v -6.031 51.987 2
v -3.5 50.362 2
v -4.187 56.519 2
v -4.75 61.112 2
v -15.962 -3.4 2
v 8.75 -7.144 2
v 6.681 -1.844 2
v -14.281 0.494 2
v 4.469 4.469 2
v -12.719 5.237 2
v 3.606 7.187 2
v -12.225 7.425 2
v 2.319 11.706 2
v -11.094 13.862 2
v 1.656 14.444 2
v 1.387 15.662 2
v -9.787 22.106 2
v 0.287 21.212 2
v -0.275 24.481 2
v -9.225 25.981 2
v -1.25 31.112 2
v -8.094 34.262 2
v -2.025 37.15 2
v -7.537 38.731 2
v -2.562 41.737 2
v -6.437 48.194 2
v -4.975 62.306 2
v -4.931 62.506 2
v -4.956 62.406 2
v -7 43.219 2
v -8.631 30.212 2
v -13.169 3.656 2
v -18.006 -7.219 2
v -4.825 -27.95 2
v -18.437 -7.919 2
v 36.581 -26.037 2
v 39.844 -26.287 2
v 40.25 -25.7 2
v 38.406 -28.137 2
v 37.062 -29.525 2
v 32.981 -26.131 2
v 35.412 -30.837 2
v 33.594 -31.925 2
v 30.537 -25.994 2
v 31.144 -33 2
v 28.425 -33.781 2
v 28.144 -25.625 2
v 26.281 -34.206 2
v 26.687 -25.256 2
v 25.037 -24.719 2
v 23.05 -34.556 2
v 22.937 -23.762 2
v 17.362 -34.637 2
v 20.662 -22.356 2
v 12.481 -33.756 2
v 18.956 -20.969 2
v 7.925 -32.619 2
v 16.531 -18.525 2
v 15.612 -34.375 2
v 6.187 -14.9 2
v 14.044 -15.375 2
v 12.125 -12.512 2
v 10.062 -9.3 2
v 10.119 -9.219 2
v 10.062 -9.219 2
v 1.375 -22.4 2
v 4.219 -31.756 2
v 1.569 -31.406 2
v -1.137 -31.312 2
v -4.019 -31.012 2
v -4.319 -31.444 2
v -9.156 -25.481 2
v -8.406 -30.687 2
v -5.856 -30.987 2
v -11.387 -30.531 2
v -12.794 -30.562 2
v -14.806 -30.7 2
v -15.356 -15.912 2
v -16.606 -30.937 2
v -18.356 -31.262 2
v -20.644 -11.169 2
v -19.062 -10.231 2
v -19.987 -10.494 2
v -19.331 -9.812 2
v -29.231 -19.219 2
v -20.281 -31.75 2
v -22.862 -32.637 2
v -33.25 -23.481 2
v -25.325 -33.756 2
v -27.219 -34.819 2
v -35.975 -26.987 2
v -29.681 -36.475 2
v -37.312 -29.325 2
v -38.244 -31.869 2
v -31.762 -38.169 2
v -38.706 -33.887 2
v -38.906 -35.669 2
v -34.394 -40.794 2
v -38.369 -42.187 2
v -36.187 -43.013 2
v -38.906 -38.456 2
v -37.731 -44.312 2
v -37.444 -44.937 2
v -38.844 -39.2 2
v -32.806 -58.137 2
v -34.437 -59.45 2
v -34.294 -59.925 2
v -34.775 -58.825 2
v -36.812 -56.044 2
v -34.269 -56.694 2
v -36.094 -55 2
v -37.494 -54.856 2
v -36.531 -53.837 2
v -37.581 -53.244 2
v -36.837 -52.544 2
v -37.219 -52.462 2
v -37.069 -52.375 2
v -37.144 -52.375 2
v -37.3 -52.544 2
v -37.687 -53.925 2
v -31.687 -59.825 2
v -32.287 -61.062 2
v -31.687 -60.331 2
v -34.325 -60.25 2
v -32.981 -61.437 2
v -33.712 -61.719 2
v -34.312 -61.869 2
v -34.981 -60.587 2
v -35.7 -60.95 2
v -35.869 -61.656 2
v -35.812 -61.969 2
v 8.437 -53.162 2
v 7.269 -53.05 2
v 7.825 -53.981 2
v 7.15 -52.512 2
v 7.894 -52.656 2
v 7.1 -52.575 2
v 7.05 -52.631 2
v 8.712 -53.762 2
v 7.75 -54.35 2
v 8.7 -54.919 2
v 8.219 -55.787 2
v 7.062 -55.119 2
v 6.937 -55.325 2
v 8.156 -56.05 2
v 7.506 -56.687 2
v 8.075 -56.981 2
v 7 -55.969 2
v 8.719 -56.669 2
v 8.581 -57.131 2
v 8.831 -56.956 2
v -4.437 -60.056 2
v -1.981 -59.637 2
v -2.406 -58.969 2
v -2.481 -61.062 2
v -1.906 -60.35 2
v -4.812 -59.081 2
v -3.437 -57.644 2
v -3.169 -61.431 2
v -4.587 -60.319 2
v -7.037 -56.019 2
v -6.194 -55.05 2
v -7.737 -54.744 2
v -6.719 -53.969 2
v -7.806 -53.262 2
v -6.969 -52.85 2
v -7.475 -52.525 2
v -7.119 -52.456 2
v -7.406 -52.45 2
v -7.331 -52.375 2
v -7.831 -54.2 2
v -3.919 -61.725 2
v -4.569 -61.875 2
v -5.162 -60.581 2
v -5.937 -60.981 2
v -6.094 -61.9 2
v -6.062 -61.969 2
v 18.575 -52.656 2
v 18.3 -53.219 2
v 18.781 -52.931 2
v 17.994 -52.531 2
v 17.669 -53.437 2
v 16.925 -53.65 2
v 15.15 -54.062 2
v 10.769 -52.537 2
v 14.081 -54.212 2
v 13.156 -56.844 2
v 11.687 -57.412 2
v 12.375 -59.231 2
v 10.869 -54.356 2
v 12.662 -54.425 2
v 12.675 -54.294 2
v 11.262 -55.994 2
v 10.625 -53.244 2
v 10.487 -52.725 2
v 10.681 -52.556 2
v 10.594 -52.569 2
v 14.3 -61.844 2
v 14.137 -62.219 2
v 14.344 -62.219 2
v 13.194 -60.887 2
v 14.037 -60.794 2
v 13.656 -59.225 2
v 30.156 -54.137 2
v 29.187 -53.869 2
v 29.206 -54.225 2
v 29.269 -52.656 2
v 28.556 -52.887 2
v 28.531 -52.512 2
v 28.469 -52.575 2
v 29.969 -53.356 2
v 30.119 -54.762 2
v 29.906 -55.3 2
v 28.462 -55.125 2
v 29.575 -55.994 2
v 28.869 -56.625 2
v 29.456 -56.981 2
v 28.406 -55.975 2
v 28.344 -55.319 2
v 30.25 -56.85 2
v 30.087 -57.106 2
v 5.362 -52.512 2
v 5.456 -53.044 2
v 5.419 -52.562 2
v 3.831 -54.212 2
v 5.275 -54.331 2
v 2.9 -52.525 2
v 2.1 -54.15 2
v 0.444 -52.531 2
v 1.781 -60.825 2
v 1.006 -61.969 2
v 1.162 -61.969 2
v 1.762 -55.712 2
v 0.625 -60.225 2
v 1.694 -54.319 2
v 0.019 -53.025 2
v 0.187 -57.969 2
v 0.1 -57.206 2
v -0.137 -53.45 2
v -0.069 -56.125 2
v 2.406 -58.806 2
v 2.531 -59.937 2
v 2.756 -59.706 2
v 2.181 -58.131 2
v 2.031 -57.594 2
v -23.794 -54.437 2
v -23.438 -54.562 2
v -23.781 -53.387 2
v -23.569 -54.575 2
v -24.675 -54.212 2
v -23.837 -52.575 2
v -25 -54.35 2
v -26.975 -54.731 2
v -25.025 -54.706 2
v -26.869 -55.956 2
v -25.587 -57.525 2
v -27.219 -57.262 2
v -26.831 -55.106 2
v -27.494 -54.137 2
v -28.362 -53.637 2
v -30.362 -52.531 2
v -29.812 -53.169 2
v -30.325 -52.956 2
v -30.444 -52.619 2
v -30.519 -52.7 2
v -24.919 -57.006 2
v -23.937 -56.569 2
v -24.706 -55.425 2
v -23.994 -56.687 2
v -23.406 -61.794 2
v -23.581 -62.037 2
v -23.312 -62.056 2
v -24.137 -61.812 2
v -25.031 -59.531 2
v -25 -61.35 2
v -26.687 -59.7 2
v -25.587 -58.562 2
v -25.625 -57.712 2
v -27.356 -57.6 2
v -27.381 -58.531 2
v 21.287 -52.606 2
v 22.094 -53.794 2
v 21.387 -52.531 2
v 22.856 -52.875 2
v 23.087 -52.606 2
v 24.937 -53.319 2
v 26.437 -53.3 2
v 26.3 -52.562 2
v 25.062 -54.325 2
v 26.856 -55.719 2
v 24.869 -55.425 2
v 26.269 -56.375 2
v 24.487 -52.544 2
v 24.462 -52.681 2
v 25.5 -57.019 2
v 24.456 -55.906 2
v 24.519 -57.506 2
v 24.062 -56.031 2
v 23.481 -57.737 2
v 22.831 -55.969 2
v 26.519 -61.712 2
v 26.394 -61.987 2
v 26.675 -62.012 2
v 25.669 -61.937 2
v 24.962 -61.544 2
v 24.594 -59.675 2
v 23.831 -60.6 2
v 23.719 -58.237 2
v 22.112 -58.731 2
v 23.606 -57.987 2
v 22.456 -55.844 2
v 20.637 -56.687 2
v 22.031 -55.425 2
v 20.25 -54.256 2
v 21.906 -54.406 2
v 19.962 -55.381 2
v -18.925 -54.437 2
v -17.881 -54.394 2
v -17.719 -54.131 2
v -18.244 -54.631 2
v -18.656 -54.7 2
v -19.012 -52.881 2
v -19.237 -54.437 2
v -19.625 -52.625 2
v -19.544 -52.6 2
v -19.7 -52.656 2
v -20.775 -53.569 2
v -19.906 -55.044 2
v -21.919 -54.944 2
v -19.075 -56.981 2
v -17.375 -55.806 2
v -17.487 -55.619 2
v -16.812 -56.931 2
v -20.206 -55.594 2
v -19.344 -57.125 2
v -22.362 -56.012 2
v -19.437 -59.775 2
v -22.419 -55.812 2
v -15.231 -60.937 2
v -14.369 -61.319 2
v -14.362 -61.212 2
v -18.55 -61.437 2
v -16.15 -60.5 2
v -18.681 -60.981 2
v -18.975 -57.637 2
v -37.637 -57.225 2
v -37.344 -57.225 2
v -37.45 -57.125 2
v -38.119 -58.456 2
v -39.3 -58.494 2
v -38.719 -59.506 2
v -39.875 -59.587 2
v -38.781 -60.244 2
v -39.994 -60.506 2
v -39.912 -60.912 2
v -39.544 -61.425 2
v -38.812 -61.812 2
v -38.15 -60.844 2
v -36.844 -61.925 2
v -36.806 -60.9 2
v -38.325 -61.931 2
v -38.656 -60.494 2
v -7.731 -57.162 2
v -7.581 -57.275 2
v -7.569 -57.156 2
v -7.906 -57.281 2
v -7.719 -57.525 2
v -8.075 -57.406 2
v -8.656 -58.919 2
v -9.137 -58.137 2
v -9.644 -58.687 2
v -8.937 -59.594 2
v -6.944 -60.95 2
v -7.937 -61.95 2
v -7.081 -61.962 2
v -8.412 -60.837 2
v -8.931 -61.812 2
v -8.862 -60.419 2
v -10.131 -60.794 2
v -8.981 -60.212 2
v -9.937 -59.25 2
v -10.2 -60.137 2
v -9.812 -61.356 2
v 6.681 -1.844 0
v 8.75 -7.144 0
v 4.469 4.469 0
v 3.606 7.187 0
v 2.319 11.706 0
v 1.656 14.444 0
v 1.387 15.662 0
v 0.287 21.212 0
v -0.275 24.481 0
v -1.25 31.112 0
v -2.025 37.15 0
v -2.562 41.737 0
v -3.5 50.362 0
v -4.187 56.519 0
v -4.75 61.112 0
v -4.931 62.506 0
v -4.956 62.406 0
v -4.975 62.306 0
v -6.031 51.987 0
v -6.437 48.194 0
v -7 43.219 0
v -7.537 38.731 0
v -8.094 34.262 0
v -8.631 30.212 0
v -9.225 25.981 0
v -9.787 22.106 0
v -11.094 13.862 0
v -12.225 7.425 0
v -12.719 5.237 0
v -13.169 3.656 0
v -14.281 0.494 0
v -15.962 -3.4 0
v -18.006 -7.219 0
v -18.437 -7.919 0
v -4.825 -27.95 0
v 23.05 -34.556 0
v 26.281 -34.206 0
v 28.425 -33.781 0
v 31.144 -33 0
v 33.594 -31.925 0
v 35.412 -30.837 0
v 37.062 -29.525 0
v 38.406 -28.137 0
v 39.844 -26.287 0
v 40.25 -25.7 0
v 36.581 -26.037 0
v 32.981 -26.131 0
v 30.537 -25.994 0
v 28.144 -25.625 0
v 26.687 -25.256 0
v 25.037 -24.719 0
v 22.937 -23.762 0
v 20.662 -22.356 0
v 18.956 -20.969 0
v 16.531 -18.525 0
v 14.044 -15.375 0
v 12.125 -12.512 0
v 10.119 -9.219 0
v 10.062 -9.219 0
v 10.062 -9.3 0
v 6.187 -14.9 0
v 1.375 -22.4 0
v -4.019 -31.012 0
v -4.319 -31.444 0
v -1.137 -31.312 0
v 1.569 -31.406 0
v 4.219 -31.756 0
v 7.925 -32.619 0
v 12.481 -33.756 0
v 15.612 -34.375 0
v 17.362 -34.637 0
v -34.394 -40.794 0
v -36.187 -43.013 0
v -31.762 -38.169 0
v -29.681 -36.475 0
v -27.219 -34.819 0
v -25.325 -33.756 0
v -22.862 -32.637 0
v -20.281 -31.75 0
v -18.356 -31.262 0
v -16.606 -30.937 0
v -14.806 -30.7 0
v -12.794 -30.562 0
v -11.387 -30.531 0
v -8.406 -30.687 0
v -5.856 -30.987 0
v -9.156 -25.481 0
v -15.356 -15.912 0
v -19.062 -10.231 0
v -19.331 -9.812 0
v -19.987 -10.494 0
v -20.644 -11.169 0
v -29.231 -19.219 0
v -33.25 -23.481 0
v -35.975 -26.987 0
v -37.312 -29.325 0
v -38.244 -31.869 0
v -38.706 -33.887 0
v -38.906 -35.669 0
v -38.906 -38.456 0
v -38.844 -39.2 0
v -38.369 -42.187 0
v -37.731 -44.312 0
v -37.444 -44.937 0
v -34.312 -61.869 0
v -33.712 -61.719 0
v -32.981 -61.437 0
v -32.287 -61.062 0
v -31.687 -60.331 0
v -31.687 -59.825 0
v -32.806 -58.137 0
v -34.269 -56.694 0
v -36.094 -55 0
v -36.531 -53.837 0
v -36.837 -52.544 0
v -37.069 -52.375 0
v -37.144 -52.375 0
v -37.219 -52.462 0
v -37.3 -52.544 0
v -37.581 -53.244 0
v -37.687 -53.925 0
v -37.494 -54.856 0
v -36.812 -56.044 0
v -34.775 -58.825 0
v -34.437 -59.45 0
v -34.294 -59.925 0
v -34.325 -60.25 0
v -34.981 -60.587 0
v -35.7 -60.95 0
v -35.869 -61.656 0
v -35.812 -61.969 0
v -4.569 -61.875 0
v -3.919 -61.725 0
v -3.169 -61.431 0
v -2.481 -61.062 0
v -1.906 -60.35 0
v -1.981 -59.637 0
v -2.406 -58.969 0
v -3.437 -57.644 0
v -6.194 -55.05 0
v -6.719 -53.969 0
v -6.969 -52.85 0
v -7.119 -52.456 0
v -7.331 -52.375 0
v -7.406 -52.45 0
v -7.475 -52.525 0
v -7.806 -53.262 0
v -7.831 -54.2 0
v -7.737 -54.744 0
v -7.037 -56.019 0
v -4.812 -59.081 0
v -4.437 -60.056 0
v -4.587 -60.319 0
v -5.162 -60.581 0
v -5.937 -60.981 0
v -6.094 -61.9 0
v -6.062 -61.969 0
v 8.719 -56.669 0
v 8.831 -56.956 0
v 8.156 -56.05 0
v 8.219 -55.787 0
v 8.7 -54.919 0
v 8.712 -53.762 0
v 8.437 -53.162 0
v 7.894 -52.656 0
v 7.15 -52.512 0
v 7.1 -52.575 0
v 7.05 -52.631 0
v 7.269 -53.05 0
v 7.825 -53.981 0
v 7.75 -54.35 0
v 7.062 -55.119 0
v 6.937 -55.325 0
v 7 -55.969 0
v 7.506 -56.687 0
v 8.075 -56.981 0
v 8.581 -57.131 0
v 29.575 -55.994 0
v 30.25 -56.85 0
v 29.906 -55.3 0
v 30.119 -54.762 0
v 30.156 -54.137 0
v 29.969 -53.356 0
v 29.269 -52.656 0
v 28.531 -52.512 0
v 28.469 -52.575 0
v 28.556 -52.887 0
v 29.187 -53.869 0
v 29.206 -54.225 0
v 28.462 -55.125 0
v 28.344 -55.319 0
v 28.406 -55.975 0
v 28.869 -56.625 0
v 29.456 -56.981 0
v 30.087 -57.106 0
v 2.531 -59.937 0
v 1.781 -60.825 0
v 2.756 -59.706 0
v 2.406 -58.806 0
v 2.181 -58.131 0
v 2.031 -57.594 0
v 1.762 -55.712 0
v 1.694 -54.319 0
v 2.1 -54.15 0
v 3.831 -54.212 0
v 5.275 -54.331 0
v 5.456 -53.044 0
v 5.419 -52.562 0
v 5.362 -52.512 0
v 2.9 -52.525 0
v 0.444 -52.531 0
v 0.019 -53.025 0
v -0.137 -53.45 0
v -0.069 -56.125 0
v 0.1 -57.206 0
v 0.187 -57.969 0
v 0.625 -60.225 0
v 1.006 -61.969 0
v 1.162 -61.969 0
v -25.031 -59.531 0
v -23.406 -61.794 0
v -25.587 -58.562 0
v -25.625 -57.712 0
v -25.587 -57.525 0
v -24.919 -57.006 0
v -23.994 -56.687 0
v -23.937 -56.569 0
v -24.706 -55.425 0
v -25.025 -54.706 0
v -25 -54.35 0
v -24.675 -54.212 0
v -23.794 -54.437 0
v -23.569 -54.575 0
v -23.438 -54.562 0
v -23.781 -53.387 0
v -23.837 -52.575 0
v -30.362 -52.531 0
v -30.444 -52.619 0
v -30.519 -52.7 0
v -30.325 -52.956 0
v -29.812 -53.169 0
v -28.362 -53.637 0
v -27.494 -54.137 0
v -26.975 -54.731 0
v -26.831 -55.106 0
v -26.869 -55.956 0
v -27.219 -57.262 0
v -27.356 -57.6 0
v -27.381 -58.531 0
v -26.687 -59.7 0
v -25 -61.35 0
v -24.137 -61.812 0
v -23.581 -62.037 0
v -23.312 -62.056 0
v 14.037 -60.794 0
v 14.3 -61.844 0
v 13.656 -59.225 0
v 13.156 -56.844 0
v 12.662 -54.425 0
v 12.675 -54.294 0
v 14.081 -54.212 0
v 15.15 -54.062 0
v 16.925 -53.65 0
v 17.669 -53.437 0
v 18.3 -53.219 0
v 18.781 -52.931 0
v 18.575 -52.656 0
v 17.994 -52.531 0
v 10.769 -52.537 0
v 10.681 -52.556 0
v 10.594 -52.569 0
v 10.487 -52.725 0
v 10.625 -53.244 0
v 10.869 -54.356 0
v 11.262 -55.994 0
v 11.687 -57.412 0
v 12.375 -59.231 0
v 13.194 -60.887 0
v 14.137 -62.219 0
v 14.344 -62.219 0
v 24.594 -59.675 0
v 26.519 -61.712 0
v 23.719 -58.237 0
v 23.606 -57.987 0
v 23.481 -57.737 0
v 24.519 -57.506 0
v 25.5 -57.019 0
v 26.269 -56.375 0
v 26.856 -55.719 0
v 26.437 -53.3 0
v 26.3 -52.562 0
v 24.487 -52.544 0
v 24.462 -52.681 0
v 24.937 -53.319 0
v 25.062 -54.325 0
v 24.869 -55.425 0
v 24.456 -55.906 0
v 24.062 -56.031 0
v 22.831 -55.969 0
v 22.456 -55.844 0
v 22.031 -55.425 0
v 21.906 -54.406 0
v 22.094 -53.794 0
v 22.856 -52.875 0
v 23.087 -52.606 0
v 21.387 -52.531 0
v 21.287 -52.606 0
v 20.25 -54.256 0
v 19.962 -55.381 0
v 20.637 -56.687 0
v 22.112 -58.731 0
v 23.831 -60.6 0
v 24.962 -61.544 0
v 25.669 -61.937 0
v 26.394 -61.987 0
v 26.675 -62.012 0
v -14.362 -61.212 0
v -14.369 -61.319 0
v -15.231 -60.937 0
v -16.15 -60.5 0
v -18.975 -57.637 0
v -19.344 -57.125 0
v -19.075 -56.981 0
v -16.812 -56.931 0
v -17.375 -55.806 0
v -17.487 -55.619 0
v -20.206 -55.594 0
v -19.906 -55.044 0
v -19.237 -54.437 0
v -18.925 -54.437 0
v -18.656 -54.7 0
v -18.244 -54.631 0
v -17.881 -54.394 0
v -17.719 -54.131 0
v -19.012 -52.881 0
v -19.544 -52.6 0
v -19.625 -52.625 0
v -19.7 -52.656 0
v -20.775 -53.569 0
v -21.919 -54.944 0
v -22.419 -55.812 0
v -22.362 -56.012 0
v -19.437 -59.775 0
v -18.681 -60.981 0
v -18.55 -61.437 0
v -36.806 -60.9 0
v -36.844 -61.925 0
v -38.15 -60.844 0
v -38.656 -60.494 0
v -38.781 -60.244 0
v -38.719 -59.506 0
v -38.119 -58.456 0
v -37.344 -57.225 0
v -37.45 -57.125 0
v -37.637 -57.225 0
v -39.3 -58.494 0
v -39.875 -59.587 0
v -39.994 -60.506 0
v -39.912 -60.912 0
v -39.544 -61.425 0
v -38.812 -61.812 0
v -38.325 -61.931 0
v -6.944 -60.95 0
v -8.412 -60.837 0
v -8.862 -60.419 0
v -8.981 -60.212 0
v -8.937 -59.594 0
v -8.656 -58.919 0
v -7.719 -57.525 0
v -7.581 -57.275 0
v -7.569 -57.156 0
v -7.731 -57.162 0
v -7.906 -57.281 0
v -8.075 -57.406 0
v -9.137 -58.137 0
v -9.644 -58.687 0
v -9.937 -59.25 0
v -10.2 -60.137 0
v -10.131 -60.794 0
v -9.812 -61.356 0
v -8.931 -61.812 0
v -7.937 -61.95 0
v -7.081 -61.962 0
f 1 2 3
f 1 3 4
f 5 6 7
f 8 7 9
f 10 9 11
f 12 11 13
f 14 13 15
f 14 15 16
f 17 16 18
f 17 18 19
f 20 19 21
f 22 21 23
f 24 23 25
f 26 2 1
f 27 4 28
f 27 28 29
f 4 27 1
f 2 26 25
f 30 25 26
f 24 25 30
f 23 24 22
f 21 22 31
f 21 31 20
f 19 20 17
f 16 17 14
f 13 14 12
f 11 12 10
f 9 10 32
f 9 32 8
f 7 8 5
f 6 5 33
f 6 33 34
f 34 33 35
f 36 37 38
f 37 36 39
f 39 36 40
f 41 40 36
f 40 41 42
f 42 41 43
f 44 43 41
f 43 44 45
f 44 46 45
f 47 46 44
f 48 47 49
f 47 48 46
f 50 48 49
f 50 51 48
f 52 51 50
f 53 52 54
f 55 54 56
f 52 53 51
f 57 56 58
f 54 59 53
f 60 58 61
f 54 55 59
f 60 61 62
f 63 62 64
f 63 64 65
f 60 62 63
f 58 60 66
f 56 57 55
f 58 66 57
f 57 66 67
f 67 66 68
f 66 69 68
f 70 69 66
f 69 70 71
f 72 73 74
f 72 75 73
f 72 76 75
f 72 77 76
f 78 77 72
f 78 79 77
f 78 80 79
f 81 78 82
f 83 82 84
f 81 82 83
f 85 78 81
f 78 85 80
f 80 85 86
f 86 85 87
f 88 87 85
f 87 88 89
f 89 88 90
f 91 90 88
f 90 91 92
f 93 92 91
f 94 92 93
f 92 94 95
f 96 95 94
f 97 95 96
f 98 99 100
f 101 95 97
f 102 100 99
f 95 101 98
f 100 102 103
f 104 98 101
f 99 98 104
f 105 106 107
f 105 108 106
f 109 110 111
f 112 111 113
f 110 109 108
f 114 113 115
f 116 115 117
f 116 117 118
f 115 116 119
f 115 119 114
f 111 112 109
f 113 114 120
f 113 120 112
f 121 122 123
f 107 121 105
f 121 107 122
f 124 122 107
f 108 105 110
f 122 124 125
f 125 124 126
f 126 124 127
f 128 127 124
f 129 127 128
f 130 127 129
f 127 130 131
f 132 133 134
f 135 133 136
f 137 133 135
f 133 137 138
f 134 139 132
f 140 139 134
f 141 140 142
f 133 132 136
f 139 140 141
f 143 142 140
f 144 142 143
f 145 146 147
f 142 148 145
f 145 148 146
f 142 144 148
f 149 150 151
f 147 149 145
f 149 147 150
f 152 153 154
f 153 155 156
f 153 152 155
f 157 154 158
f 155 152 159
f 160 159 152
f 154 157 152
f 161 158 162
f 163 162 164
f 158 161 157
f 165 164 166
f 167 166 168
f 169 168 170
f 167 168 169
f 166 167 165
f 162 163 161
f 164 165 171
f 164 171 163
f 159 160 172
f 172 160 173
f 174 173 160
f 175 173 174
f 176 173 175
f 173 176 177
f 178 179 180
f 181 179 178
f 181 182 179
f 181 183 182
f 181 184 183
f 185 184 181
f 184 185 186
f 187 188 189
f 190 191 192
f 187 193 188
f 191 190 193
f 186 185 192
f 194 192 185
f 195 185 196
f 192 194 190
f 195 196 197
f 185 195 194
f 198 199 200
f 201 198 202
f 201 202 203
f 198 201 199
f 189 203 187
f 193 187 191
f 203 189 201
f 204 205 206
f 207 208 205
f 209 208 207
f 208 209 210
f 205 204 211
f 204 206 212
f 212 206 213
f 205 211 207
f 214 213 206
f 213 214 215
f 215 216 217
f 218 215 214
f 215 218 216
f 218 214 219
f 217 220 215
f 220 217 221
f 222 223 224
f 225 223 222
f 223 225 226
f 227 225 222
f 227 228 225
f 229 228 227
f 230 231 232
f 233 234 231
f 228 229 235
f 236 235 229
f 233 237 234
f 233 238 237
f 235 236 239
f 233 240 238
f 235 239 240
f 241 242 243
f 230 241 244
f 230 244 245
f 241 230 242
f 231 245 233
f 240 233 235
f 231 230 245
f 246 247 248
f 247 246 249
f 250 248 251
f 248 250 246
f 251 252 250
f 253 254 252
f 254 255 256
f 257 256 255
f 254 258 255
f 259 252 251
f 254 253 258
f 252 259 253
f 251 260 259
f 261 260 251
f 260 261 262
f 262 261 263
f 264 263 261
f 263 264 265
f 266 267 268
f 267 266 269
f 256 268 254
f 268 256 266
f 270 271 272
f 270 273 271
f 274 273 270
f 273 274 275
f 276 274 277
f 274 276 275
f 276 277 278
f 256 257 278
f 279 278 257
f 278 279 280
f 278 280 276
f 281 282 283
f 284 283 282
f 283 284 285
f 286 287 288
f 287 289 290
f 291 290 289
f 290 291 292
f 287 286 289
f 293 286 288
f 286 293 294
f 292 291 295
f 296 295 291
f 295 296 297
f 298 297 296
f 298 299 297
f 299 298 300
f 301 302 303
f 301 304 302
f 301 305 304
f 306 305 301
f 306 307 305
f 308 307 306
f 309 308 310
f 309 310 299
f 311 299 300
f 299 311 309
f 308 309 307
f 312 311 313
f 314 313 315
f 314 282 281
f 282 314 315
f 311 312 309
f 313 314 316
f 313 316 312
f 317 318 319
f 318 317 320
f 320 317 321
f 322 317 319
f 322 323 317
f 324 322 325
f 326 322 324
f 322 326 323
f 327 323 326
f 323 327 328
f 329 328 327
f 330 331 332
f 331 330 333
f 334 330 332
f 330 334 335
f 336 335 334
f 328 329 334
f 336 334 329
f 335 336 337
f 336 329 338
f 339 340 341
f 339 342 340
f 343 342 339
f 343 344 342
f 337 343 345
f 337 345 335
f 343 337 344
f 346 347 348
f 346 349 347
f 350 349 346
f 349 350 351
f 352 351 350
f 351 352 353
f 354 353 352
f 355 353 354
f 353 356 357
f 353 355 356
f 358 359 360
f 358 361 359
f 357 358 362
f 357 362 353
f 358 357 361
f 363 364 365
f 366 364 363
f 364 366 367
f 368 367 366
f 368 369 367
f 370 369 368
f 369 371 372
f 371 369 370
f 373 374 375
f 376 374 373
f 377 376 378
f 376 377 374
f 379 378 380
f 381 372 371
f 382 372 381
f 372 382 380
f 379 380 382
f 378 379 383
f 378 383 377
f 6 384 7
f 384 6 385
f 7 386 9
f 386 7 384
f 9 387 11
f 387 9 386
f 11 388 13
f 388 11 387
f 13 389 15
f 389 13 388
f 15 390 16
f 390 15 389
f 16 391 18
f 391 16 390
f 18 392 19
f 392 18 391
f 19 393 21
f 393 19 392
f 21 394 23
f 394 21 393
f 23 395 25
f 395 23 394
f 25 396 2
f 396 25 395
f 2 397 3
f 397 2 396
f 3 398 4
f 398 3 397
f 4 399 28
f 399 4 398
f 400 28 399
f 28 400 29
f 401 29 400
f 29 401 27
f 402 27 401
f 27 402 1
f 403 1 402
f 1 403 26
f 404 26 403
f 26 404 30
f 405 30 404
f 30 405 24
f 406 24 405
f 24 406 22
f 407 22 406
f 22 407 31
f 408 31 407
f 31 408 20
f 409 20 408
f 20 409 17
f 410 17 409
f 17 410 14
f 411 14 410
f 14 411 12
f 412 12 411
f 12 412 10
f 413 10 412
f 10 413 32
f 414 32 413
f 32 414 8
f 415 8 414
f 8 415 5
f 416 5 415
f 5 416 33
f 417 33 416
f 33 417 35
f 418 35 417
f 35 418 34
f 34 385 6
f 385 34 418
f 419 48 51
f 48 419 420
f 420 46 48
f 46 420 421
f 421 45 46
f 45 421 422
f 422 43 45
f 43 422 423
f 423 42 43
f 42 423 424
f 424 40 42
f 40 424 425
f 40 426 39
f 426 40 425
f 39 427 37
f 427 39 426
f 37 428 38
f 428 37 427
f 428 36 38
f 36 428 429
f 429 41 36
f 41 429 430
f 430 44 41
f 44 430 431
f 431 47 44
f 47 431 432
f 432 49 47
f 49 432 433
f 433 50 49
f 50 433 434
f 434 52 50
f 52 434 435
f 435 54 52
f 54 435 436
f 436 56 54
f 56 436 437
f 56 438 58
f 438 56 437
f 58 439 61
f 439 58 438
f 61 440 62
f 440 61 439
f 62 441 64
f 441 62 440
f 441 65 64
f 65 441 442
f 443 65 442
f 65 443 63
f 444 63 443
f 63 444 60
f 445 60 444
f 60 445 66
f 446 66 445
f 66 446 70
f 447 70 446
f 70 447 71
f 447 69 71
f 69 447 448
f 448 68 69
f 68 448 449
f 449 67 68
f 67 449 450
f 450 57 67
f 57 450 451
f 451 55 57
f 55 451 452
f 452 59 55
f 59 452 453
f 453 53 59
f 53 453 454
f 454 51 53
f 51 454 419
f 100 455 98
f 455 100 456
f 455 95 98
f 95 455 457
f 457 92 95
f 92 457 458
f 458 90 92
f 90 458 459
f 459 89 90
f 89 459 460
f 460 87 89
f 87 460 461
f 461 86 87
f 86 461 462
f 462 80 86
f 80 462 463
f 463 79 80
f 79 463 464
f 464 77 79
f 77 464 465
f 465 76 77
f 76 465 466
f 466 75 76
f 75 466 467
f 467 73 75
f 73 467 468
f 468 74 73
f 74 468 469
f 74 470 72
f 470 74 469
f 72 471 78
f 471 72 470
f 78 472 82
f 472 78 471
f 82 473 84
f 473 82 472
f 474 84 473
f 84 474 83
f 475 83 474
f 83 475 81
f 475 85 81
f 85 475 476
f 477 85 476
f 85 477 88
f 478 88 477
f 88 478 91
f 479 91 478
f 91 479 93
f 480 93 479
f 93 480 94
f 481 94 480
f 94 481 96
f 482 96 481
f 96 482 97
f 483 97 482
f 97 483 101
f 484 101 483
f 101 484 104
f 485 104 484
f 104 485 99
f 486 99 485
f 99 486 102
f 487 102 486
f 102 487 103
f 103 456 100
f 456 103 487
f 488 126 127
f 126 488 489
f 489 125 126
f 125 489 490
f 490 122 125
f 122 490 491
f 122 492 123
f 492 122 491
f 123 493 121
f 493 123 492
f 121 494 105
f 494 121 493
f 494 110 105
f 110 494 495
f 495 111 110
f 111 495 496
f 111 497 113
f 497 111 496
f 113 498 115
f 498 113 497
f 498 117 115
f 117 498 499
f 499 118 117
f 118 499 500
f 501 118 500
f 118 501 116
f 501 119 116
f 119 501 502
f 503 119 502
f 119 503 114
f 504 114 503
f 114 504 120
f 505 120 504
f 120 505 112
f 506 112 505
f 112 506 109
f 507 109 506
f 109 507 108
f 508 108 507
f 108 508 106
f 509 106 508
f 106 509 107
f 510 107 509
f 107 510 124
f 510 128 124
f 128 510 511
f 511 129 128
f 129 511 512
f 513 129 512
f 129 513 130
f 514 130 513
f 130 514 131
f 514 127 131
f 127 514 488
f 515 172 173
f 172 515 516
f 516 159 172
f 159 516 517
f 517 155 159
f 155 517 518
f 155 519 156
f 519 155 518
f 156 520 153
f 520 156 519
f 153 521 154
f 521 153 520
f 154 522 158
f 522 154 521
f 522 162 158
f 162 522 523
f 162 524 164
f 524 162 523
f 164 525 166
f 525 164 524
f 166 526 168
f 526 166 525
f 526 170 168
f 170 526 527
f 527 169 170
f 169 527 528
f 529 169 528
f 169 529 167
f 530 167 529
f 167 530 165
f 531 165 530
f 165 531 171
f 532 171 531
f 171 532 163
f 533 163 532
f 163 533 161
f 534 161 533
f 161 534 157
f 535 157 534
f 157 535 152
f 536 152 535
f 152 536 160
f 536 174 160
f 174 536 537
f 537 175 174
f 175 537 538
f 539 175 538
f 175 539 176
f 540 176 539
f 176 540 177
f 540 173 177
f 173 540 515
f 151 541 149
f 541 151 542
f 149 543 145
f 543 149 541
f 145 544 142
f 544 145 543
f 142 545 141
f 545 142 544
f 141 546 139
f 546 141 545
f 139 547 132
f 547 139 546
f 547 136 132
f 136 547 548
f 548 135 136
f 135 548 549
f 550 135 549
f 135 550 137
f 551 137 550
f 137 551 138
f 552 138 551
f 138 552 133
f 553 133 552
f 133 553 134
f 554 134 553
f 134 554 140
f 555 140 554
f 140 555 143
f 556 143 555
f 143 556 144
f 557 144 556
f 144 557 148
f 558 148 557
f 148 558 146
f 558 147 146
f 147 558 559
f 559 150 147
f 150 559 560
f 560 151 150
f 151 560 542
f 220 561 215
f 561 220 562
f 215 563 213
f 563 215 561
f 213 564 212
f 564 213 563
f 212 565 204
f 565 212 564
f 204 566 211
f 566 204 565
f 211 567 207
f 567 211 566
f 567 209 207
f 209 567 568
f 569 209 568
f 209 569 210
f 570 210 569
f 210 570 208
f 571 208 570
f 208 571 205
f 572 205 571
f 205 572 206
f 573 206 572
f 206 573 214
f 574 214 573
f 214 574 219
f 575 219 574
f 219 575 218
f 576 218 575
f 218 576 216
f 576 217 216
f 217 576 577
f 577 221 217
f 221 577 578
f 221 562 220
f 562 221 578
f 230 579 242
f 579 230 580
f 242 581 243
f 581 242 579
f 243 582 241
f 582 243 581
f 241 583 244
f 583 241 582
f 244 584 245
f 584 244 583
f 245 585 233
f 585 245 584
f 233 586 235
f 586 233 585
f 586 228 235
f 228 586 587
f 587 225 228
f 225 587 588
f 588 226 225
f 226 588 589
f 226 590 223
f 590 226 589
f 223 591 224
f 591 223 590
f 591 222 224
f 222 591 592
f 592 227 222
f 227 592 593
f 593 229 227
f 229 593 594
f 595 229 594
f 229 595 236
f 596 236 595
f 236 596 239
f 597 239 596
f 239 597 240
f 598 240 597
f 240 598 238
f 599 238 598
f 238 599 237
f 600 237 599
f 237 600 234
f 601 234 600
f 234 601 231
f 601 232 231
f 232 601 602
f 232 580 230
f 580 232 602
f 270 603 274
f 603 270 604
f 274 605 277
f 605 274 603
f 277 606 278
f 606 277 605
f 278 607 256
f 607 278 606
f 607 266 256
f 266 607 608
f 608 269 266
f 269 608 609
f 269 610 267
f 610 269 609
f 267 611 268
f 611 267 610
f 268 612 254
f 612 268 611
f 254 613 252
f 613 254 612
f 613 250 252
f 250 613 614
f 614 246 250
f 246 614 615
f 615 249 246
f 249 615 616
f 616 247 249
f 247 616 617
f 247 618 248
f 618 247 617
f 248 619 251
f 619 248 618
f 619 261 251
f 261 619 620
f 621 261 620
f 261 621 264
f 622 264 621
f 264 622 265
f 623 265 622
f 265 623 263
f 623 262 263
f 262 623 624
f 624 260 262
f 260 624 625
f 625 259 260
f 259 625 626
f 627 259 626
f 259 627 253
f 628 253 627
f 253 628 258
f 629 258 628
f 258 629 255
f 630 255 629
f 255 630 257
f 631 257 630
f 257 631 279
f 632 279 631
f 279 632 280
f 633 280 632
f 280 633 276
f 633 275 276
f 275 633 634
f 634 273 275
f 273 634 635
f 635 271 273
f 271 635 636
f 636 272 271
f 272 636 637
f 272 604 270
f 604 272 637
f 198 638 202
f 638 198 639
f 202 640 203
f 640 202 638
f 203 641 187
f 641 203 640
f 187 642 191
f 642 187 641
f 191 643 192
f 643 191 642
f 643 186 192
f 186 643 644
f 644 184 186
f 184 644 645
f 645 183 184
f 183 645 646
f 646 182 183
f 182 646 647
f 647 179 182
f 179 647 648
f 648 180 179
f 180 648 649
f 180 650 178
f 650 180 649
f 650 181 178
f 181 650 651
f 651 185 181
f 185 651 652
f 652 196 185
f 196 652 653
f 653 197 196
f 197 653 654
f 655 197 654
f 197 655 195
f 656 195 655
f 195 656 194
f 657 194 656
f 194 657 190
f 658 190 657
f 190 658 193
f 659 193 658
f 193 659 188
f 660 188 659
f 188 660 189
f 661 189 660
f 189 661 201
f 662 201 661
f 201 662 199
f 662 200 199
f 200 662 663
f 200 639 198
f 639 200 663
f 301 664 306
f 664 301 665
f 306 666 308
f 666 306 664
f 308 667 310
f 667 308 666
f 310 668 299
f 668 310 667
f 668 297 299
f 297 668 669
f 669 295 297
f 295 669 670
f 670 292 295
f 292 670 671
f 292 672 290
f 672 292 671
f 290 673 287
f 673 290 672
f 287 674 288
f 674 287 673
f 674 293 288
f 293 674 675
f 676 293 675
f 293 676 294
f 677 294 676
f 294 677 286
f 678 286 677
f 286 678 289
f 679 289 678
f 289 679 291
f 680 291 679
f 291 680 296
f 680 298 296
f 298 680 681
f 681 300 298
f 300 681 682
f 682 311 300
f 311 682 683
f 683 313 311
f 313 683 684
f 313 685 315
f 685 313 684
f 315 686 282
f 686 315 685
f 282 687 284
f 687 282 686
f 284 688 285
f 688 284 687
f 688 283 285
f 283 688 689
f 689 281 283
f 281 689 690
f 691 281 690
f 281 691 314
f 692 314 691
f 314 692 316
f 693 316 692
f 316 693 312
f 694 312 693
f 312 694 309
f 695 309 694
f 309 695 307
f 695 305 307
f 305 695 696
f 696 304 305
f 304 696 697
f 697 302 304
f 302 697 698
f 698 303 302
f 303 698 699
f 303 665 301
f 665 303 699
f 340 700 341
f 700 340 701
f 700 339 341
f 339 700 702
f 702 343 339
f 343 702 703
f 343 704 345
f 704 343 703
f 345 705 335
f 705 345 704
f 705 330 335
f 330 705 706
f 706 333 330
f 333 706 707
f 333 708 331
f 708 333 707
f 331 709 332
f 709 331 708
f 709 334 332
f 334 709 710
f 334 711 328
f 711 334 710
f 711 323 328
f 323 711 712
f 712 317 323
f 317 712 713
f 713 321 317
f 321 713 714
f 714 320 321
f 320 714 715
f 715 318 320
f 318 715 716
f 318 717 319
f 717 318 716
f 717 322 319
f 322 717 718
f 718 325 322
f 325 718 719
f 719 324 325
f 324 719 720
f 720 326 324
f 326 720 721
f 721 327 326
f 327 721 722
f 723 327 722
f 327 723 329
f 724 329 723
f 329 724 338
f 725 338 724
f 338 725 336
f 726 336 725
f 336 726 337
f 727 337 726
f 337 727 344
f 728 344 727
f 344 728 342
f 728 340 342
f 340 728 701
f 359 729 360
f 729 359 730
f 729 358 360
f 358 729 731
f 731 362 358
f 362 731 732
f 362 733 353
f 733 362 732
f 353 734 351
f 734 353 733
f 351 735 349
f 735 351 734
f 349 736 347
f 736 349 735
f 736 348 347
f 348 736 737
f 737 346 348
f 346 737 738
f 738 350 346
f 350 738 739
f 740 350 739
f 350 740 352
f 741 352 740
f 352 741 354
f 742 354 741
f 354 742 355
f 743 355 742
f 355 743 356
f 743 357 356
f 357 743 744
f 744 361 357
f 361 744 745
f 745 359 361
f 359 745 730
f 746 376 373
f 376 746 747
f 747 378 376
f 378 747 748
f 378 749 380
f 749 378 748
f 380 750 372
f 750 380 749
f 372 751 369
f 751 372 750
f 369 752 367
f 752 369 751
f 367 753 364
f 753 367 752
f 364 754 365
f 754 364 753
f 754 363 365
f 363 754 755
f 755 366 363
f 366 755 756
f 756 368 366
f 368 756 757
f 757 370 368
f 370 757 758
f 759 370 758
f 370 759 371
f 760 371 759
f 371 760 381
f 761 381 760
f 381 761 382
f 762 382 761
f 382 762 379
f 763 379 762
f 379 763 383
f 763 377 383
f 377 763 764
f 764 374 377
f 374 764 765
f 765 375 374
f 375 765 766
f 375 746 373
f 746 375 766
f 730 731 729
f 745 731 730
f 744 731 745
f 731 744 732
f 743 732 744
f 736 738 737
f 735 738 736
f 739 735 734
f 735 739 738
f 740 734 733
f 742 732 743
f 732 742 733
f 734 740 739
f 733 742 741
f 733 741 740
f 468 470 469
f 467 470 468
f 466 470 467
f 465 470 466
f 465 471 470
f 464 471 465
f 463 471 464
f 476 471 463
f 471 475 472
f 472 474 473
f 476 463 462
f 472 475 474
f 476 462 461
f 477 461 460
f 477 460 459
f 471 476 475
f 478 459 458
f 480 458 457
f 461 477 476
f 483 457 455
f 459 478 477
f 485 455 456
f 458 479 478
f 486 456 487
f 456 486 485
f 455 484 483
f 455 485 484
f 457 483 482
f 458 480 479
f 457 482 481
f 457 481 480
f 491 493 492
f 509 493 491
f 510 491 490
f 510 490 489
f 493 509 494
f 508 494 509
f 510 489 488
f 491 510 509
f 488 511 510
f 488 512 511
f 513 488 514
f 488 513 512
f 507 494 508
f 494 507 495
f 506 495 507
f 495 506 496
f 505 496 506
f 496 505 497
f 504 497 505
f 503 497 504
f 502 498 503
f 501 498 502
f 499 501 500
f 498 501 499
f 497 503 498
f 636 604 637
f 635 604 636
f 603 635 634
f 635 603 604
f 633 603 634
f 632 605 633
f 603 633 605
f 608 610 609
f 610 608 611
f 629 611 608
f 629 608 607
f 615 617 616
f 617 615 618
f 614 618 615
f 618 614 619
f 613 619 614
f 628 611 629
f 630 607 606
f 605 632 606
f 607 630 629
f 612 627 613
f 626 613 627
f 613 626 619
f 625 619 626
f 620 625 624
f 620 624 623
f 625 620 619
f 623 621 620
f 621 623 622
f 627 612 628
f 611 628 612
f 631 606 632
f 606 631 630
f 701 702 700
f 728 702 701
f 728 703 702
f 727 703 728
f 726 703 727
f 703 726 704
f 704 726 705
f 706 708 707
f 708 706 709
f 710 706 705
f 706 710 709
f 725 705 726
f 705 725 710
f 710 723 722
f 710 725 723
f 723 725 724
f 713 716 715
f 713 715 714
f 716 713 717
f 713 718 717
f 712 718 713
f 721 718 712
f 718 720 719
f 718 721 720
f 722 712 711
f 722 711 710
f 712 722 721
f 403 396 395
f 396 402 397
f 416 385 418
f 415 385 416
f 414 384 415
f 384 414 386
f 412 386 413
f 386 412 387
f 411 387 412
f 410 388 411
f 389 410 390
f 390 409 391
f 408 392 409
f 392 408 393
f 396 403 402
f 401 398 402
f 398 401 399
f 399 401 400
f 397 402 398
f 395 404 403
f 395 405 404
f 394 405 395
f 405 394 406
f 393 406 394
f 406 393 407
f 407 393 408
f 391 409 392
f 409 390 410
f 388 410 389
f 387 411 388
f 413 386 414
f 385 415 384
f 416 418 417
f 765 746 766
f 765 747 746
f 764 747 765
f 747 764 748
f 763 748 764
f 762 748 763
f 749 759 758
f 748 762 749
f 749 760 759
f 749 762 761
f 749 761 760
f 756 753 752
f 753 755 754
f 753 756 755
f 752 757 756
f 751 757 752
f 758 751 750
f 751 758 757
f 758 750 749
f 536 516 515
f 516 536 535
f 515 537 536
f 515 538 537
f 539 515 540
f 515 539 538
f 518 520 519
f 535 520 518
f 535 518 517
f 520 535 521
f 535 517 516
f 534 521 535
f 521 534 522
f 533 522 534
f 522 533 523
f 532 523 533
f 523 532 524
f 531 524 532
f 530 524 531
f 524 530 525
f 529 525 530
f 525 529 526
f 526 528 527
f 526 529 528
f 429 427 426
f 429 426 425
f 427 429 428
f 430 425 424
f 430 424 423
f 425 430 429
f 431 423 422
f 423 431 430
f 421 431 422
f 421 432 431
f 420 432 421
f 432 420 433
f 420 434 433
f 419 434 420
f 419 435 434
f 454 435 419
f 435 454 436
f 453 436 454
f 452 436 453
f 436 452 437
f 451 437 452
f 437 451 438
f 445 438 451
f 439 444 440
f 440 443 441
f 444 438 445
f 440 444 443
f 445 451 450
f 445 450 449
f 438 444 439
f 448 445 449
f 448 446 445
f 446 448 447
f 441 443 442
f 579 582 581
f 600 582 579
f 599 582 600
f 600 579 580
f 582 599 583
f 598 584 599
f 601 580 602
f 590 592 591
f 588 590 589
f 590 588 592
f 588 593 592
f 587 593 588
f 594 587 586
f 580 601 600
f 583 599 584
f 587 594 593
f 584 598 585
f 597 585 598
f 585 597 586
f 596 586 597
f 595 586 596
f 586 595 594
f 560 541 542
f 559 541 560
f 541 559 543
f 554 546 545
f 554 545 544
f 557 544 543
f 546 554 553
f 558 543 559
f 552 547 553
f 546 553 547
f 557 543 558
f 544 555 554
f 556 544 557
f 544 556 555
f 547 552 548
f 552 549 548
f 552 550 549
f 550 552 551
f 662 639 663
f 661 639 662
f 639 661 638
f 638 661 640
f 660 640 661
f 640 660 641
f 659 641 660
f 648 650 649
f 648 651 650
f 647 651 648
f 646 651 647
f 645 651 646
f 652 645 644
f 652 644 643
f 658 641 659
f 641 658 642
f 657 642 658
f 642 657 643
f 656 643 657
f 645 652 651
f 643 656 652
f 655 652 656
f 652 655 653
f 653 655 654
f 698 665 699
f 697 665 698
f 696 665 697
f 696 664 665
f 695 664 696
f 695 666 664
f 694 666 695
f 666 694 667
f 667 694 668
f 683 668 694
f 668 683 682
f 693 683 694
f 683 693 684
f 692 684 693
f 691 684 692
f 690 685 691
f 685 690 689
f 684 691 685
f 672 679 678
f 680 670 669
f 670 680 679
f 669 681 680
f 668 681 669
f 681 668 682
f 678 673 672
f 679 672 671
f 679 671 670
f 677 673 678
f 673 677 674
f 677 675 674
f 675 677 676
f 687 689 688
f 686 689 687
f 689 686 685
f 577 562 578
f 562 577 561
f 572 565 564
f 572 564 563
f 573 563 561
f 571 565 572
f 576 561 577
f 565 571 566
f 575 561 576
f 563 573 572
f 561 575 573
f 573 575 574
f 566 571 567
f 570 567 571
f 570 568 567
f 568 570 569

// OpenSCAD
module 177e80aef5b1cff0e52ee7d6a78be1b3_1()
{
 /* Generated by trace2scad version 20150415
    http://aggregate.org/MAKE/TRACE2SCAD/
    Optimized model has 387/4796 original points
 */
 color([0.48, 0.48, 0.48])
 assign(minx=0) /* polygon minx=39 */
 assign(miny=0) /* polygon miny=45 */
 assign(maxx=12880) /* polygon maxx=12880 */
 assign(maxy=20000) /* polygon maxy=20001 */
 assign(dx=maxx-minx)
 assign(dy=maxy-miny)
 assign(maxd=((dx>dy)?dx:dy))
 scale([1/maxd, 1/maxd, 1])
 translate([-minx-dx/2, -miny-dy/2, 0])
 linear_extrude(height=1, convexity=387)
 union() {
  union() {
   polygon([[5647,19985],[5644,19969],[5475,18318],[5410,17711],[5320,16915],[5234,16197],[5145,15482],[5059,14834],[4964,14157],[4874,13537],[4665,12218],[4484,11188],[4405,10838],[4333,10585],[4155,10079],[3886,9456],[3559,8845],[3490,8733],[5668,5528],[7840,8857],[7509,9705],[7155,10715],[7017,11150],[6811,11873],[6705,12311],[6662,12506],[6486,13394],[6396,13917],[6240,14978],[6116,15944],[6030,16678],[5880,18058],[5770,19043],[5680,19778],[5651,20001]], convexity=6);
   polygon([[8050,8518],[8050,8512],[7430,7616],[6660,6416],[5797,5038],[5749,4969],[6258,4990],[6691,4975],[7115,4919],[7708,4781],[8437,4599],[8938,4500],[9218,4458],[10128,4471],[10645,4527],[10988,4595],[11423,4720],[11815,4892],[12106,5066],[12370,5276],[12585,5498],[12815,5794],[12880,5888],[12293,5834],[11717,5819],[11326,5841],[10943,5900],[10710,5959],[10446,6045],[10110,6198],[9746,6423],[9473,6645],[9085,7036],[8687,7540],[8380,7998],[8059,8525],[8050,8525]], convexity=9);
   polygon([[3242,8321],[3137,8213],[1763,6925],[1120,6243],[684,5682],[470,5308],[321,4901],[247,4578],[215,4293],[215,3847],[225,3728],[301,3250],[403,2910],[449,2810],[650,3118],[937,3473],[1358,3893],[1691,4164],[2085,4429],[2388,4599],[2782,4778],[3195,4920],[3503,4998],[3783,5050],[4071,5088],[4393,5110],[4618,5115],[5095,5090],[5503,5042],[4975,5923],[3983,7454],[3390,8363],[3347,8430]], convexity=7);
   polygon([[485,1606],[472,1593],[427,1481],[410,1372],[441,1223],[550,1033],[876,588],[930,488],[953,412],[948,360],[843,306],[728,248],[701,135],[710,85],[950,101],[1046,125],[1163,170],[1274,230],[1370,347],[1370,428],[1191,698],[957,929],[665,1200],[595,1386],[546,1593],[509,1620],[497,1620]], convexity=8);
   polygon([[5255,1608],[5244,1596],[5191,1478],[5187,1328],[5202,1241],[5314,1037],[5670,547],[5730,391],[5706,349],[5614,307],[5490,243],[5465,96],[5470,85],[5709,100],[5813,124],[5933,171],[6043,230],[6135,344],[6123,458],[6055,565],[5890,777],[5449,1192],[5365,1365],[5325,1544],[5301,1607],[5267,1620]], convexity=8);
   polygon([[6904,1596],[6511,1595],[6443,1516],[6418,1448],[6429,1020],[6456,847],[6470,725],[6540,364],[6601,85],[6626,85],[6725,268],[6845,410],[6881,447],[6825,591],[6789,699],[6765,785],[6722,1086],[6711,1309],[6776,1336],[7053,1326],[7284,1307],[7313,1513],[7307,1590],[7298,1598]], convexity=10);
   polygon([[7576,1588],[7568,1579],[7603,1512],[7692,1363],[7680,1304],[7570,1181],[7550,1148],[7560,1045],[7641,930],[7732,883],[7813,859],[7853,887],[7835,933],[7745,1032],[7755,1074],[7832,1213],[7834,1398],[7790,1494],[7703,1575],[7584,1598]], convexity=10);
   polygon([[11000,1593],[10995,1588],[11009,1538],[11110,1381],[11113,1324],[10994,1180],[10975,1149],[10985,1044],[11059,940],[11153,883],[11254,863],[11280,904],[11172,1041],[11225,1152],[11259,1238],[11265,1338],[11235,1463],[11123,1575],[11005,1598]], convexity=10);
   polygon([[1569,1581],[1557,1568],[1588,1527],[1670,1493],[1902,1418],[2041,1338],[2124,1243],[2147,1183],[2141,1047],[2085,838],[2063,784],[2059,635],[2170,448],[2440,184],[2578,110],[2667,74],[2710,71],[2695,113],[2435,475],[2346,630],[2340,766],[2346,796],[2453,879],[2601,930],[2610,949],[2487,1132],[2436,1247],[2440,1304],[2492,1326],[2633,1290],[2669,1268],[2690,1270],[2635,1458],[2626,1588],[1582,1595]], convexity=13);
   polygon([[8149,1591],[8135,1589],[8118,1564],[8140,1481],[8179,1303],[8242,1041],[8310,814],[8420,523],[8551,258],[8702,45],[8735,45],[8728,105],[8686,273],[8625,524],[8545,905],[8466,1292],[8468,1313],[8693,1326],[8864,1350],[9148,1416],[9267,1450],[9368,1485],[9445,1531],[9412,1575],[9319,1595],[8163,1594]], convexity=9);
   polygon([[9854,1589],[9846,1583],[9680,1319],[9634,1139],[9742,930],[9978,603],[10253,304],[10434,153],[10547,90],[10663,82],[10708,78],[10683,126],[10375,452],[10235,682],[10217,722],[10197,762],[10363,799],[10520,877],[10643,980],[10737,1085],[10670,1472],[10648,1590],[10358,1593],[10354,1571],[10430,1469],[10450,1308],[10419,1132],[10353,1055],[10290,1035],[10093,1045],[10033,1065],[9965,1132],[9945,1295],[9975,1393],[10097,1540],[10134,1583],[9862,1595]], convexity=13);
   polygon([[3300,1580],[3288,1575],[3116,1429],[2933,1209],[2853,1070],[2862,1038],[3330,436],[3451,243],[3472,170],[4141,189],[4142,206],[4003,250],[3856,320],[3404,778],[3345,860],[3388,883],[3750,891],[3660,1071],[3642,1101],[3207,1105],[3255,1193],[3362,1290],[3412,1290],[3455,1248],[3521,1259],[3579,1297],[3605,1339],[3398,1539],[3313,1584]], convexity=12);
   polygon([[433,852],[418,844],[152,641],[60,466],[41,319],[54,254],[113,172],[230,110],[308,91],[545,92],[551,256],[336,265],[255,321],[235,361],[245,479],[341,647],[465,844],[448,860]], convexity=8);
   polygon([[5175,835],[5148,815],[4978,698],[4897,610],[4850,520],[4808,378],[4819,273],[4870,183],[5011,110],[5170,88],[5307,86],[5329,248],[5094,266],[5022,333],[5003,366],[5010,465],[5055,573],[5205,796],[5227,836],[5229,855],[5203,854]], convexity=8);
  }
 }
}

module 177e80aef5b1cff0e52ee7d6a78be1b3()
{
 /* all layers combined, scaled to within a 1mm cube */
 scale([1, 1, 1/1])
 difference() {
  union() {
   scale([1,1,2]) translate([0,0,-0.5]) 177e80aef5b1cff0e52ee7d6a78be1b3_1();
  }
  translate([0,0,-2]) cube([2,2,4],center=true);
 }
}

scale([125, 125, 2]) {
	177e80aef5b1cff0e52ee7d6a78be1b3();
}
